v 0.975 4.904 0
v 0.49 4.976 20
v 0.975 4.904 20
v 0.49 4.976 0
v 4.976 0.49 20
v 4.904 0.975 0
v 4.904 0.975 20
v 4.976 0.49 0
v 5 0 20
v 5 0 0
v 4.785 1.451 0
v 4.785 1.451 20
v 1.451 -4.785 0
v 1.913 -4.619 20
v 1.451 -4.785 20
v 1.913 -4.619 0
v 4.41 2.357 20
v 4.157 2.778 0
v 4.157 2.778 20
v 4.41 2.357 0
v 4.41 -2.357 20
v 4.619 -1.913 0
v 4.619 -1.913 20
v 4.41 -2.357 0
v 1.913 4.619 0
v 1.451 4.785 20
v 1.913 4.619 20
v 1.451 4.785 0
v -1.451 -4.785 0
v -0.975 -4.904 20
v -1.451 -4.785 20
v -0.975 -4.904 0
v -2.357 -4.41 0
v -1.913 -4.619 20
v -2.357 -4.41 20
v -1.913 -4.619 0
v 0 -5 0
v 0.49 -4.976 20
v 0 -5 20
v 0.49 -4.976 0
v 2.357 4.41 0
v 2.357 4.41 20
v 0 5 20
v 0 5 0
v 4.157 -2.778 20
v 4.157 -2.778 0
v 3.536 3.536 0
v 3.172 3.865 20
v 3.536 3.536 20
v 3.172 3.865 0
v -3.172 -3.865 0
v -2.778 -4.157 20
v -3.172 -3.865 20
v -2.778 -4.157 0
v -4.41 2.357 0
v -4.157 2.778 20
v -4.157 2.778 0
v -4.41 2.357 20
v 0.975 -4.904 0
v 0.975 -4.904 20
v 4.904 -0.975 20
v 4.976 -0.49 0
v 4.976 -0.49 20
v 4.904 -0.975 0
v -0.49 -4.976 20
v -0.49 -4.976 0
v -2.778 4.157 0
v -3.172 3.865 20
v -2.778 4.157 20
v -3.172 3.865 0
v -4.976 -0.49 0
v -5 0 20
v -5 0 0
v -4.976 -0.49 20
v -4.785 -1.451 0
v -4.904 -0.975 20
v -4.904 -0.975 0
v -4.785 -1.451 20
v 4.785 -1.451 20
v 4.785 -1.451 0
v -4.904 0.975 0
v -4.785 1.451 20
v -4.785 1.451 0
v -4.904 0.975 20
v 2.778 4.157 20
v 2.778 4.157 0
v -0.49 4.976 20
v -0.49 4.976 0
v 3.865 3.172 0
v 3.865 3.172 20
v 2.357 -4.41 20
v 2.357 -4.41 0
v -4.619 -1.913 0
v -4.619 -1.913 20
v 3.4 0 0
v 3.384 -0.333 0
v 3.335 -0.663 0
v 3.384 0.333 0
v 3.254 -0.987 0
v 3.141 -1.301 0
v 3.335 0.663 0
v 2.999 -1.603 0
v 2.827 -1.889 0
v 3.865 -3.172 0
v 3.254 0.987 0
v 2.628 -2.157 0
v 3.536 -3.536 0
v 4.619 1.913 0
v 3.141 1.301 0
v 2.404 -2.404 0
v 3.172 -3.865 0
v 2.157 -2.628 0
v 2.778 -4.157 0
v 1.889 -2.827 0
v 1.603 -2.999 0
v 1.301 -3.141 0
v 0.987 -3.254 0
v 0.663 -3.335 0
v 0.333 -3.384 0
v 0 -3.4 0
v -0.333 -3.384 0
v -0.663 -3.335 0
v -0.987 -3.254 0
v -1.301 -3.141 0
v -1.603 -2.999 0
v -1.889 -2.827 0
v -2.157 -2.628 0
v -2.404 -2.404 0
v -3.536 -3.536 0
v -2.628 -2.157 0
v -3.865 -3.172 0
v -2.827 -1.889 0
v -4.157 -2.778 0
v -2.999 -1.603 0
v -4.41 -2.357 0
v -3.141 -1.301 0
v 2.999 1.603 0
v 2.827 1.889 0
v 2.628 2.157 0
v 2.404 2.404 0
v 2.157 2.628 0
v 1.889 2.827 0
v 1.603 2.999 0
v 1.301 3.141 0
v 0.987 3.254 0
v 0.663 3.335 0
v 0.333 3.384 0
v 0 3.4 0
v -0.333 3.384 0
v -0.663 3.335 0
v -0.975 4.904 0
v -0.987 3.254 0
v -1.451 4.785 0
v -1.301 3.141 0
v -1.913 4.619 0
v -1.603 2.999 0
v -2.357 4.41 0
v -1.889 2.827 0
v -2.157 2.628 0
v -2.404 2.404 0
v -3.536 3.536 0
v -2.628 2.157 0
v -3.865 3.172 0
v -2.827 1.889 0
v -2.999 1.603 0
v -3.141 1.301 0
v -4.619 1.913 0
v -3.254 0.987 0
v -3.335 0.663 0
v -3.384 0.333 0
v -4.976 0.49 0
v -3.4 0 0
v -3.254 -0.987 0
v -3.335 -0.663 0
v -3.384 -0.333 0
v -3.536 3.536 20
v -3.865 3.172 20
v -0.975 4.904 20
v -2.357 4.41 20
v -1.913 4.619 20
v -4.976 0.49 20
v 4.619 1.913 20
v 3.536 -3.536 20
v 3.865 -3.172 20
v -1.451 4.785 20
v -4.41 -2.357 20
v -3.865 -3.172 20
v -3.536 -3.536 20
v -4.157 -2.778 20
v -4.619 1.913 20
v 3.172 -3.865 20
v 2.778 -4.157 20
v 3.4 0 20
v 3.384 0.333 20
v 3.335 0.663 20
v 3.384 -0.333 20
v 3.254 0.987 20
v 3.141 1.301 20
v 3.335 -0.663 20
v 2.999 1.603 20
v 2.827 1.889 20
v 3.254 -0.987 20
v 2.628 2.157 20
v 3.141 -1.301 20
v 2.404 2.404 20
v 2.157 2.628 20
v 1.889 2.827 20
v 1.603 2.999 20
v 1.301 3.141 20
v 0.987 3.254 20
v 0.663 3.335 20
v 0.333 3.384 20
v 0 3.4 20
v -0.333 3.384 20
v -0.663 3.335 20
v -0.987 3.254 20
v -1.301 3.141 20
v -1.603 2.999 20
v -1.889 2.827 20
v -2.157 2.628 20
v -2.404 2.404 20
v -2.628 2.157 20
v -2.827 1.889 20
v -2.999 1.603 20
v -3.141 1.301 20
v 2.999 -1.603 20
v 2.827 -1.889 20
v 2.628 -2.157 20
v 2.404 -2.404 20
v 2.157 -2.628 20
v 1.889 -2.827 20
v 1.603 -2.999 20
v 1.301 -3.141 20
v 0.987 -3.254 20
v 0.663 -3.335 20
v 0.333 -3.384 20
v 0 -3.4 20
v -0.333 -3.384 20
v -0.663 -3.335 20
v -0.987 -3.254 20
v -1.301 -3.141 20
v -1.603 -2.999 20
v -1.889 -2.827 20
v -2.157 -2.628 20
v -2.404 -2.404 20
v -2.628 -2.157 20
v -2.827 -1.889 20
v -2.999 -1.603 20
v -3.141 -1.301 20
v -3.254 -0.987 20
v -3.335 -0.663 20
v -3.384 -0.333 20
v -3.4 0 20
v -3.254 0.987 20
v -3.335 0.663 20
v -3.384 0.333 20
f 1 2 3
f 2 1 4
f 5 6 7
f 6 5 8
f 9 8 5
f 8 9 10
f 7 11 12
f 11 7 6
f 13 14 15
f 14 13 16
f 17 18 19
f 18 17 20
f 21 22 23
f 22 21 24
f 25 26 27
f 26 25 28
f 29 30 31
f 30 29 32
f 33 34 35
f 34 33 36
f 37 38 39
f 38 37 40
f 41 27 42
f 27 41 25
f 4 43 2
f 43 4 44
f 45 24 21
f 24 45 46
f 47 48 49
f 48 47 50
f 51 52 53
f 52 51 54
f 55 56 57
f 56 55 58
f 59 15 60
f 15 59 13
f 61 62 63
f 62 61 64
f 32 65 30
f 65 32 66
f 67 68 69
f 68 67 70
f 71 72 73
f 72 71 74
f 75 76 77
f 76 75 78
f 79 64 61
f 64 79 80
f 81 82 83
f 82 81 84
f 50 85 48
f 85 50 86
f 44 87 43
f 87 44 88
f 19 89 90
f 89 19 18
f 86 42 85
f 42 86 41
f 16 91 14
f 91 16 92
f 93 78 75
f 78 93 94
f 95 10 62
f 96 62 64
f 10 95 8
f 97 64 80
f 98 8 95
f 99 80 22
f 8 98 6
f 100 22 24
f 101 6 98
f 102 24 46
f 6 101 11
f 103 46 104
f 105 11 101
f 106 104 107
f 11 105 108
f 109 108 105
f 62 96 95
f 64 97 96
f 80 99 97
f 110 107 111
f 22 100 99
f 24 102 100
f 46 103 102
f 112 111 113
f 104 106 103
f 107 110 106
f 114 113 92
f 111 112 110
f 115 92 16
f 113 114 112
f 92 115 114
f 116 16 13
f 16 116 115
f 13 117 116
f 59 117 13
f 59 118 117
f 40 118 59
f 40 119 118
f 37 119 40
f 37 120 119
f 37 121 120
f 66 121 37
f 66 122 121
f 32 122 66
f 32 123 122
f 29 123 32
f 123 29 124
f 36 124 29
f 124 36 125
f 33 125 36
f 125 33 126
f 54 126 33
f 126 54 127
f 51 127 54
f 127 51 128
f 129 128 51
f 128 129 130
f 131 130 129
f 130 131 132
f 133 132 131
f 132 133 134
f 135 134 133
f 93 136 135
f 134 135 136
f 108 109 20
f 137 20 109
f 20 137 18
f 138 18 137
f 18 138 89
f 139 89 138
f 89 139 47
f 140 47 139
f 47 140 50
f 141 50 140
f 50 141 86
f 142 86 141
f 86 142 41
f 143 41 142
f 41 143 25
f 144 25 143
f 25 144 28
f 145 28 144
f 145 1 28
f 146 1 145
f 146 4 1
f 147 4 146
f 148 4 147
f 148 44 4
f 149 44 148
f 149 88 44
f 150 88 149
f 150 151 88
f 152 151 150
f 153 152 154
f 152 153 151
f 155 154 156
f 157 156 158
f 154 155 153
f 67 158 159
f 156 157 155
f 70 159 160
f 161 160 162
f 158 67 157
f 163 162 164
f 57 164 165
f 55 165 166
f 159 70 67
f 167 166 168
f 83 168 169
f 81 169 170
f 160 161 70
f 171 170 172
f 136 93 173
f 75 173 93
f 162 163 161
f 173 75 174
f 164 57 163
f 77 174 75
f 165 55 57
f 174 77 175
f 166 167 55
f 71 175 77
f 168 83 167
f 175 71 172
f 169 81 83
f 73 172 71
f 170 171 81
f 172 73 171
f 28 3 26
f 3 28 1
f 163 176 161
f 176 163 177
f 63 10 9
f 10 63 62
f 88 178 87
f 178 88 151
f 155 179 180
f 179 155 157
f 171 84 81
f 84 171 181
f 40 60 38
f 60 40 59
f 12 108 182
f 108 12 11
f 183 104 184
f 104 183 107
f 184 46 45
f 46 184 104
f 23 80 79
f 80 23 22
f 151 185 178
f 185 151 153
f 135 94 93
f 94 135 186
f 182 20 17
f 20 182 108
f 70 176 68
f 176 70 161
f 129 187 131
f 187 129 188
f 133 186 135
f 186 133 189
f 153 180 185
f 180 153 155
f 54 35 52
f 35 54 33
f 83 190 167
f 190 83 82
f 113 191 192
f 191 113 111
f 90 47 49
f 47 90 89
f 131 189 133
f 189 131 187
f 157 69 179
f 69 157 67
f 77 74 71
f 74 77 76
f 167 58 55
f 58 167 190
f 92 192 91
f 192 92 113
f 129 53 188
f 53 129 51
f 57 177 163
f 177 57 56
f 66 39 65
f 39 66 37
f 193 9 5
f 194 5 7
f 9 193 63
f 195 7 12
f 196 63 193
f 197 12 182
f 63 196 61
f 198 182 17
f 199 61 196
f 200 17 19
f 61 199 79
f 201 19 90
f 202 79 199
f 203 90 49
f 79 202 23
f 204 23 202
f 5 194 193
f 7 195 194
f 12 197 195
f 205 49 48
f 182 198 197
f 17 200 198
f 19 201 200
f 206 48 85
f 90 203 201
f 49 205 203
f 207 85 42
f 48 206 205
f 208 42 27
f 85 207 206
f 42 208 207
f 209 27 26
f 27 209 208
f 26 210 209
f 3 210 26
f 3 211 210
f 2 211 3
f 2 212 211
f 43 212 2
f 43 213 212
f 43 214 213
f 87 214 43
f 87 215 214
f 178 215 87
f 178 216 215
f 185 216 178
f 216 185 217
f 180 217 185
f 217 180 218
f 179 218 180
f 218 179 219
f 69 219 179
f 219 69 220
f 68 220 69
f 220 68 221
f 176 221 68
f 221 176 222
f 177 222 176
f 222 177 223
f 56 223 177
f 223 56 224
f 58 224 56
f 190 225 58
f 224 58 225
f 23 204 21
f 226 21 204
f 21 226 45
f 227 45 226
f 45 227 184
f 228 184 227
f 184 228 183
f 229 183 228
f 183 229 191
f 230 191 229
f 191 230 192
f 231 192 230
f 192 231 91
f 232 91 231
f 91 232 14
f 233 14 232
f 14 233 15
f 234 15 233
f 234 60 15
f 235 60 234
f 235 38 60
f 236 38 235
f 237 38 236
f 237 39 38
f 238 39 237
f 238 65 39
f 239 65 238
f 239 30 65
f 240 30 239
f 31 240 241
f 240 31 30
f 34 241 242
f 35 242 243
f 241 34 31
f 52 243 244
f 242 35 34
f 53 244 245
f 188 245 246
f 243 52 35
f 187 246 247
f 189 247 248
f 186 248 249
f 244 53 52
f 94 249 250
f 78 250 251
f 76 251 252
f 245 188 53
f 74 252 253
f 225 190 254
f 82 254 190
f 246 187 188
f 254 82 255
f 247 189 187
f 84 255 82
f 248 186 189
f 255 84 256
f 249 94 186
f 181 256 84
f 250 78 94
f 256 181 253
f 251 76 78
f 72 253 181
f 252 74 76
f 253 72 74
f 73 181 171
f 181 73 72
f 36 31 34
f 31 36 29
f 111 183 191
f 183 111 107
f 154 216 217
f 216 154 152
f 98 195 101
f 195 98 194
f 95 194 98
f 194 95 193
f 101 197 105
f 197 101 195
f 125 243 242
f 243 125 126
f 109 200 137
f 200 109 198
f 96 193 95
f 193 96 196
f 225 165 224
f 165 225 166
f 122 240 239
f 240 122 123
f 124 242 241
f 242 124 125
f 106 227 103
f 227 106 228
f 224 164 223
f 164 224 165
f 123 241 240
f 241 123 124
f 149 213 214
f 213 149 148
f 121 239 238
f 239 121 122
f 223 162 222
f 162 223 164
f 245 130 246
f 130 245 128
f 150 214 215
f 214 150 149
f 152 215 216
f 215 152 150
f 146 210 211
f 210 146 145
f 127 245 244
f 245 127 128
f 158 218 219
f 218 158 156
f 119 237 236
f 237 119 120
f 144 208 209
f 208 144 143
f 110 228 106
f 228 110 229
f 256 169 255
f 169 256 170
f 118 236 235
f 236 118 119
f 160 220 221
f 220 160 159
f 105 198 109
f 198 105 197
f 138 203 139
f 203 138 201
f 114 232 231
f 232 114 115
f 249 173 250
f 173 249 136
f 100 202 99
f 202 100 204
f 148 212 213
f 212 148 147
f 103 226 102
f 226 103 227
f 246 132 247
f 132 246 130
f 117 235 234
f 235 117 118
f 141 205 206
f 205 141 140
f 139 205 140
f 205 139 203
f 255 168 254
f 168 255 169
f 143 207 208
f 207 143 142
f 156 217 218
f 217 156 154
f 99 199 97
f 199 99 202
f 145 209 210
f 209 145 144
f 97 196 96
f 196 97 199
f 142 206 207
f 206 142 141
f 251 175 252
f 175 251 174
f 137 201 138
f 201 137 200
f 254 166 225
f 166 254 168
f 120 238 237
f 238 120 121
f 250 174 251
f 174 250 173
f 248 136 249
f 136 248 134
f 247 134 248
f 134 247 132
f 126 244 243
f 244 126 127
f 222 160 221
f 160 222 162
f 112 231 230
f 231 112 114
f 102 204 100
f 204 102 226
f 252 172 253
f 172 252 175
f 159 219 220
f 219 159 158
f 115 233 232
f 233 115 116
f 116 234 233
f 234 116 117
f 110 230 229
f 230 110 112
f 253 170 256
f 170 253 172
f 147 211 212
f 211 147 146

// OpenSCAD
// Lab funnel - printed upright, open top and bottom
// Units: mm

$fn = 64;

// --- Dimensions ---
spout_od      = 10;   // spout outer diameter (z = 0 to 20)
spout_length  = 20;   // spout length
cone_top_od   = 10;   // cone outer diameter at z = 20
cone_rim_od   = 60;   // cone rim outer diameter at z = 50
cone_height   = 30;   // cone height (z = 20 to 50)
wall          = 1.6;  // wall thickness everywhere

// --- Derived ---
spout_id = spout_od - 2 * wall;  // bore of spout
// Cone walls slope outward, so the bore narrows from spout_id at cone_top_od
// to (cone_rim_od - 2 * wall) at the rim.

// --- Model ---
union() {
    // Straight spout
    difference() {
        cylinder(d = spout_od, h = spout_length);
        translate([0, 0, -1])
            cylinder(d = spout_id, h = spout_length + 2);
    }

    // Cone on top of spout (seam at cone_top_od)
    difference() {
        translate([0, 0, spout_length])
            linear_extrude(height = cone_height)
                polygon([cone_top_od / 2, cone_top_od / 2,
                         cone_rim_od / 2, -cone_rim_od / 2,
                         -cone_top_od / 2, -cone_top_od / 2]);
        translate([0, 0, spout_length - 1])
            linear_extrude(height = cone_height + 2)
                polygon([(cone_top_od - 2 * wall) / 2, (cone_top_od - 2 * wall) / 2,
                         (cone_rim_od - 2 * wall) / 2, -(cone_rim_od - 2 * wall) / 2,
                         -(cone_top_od - 2 * wall) / 2, -(cone_top_od - 2 * wall) / 2]);
    }
}
